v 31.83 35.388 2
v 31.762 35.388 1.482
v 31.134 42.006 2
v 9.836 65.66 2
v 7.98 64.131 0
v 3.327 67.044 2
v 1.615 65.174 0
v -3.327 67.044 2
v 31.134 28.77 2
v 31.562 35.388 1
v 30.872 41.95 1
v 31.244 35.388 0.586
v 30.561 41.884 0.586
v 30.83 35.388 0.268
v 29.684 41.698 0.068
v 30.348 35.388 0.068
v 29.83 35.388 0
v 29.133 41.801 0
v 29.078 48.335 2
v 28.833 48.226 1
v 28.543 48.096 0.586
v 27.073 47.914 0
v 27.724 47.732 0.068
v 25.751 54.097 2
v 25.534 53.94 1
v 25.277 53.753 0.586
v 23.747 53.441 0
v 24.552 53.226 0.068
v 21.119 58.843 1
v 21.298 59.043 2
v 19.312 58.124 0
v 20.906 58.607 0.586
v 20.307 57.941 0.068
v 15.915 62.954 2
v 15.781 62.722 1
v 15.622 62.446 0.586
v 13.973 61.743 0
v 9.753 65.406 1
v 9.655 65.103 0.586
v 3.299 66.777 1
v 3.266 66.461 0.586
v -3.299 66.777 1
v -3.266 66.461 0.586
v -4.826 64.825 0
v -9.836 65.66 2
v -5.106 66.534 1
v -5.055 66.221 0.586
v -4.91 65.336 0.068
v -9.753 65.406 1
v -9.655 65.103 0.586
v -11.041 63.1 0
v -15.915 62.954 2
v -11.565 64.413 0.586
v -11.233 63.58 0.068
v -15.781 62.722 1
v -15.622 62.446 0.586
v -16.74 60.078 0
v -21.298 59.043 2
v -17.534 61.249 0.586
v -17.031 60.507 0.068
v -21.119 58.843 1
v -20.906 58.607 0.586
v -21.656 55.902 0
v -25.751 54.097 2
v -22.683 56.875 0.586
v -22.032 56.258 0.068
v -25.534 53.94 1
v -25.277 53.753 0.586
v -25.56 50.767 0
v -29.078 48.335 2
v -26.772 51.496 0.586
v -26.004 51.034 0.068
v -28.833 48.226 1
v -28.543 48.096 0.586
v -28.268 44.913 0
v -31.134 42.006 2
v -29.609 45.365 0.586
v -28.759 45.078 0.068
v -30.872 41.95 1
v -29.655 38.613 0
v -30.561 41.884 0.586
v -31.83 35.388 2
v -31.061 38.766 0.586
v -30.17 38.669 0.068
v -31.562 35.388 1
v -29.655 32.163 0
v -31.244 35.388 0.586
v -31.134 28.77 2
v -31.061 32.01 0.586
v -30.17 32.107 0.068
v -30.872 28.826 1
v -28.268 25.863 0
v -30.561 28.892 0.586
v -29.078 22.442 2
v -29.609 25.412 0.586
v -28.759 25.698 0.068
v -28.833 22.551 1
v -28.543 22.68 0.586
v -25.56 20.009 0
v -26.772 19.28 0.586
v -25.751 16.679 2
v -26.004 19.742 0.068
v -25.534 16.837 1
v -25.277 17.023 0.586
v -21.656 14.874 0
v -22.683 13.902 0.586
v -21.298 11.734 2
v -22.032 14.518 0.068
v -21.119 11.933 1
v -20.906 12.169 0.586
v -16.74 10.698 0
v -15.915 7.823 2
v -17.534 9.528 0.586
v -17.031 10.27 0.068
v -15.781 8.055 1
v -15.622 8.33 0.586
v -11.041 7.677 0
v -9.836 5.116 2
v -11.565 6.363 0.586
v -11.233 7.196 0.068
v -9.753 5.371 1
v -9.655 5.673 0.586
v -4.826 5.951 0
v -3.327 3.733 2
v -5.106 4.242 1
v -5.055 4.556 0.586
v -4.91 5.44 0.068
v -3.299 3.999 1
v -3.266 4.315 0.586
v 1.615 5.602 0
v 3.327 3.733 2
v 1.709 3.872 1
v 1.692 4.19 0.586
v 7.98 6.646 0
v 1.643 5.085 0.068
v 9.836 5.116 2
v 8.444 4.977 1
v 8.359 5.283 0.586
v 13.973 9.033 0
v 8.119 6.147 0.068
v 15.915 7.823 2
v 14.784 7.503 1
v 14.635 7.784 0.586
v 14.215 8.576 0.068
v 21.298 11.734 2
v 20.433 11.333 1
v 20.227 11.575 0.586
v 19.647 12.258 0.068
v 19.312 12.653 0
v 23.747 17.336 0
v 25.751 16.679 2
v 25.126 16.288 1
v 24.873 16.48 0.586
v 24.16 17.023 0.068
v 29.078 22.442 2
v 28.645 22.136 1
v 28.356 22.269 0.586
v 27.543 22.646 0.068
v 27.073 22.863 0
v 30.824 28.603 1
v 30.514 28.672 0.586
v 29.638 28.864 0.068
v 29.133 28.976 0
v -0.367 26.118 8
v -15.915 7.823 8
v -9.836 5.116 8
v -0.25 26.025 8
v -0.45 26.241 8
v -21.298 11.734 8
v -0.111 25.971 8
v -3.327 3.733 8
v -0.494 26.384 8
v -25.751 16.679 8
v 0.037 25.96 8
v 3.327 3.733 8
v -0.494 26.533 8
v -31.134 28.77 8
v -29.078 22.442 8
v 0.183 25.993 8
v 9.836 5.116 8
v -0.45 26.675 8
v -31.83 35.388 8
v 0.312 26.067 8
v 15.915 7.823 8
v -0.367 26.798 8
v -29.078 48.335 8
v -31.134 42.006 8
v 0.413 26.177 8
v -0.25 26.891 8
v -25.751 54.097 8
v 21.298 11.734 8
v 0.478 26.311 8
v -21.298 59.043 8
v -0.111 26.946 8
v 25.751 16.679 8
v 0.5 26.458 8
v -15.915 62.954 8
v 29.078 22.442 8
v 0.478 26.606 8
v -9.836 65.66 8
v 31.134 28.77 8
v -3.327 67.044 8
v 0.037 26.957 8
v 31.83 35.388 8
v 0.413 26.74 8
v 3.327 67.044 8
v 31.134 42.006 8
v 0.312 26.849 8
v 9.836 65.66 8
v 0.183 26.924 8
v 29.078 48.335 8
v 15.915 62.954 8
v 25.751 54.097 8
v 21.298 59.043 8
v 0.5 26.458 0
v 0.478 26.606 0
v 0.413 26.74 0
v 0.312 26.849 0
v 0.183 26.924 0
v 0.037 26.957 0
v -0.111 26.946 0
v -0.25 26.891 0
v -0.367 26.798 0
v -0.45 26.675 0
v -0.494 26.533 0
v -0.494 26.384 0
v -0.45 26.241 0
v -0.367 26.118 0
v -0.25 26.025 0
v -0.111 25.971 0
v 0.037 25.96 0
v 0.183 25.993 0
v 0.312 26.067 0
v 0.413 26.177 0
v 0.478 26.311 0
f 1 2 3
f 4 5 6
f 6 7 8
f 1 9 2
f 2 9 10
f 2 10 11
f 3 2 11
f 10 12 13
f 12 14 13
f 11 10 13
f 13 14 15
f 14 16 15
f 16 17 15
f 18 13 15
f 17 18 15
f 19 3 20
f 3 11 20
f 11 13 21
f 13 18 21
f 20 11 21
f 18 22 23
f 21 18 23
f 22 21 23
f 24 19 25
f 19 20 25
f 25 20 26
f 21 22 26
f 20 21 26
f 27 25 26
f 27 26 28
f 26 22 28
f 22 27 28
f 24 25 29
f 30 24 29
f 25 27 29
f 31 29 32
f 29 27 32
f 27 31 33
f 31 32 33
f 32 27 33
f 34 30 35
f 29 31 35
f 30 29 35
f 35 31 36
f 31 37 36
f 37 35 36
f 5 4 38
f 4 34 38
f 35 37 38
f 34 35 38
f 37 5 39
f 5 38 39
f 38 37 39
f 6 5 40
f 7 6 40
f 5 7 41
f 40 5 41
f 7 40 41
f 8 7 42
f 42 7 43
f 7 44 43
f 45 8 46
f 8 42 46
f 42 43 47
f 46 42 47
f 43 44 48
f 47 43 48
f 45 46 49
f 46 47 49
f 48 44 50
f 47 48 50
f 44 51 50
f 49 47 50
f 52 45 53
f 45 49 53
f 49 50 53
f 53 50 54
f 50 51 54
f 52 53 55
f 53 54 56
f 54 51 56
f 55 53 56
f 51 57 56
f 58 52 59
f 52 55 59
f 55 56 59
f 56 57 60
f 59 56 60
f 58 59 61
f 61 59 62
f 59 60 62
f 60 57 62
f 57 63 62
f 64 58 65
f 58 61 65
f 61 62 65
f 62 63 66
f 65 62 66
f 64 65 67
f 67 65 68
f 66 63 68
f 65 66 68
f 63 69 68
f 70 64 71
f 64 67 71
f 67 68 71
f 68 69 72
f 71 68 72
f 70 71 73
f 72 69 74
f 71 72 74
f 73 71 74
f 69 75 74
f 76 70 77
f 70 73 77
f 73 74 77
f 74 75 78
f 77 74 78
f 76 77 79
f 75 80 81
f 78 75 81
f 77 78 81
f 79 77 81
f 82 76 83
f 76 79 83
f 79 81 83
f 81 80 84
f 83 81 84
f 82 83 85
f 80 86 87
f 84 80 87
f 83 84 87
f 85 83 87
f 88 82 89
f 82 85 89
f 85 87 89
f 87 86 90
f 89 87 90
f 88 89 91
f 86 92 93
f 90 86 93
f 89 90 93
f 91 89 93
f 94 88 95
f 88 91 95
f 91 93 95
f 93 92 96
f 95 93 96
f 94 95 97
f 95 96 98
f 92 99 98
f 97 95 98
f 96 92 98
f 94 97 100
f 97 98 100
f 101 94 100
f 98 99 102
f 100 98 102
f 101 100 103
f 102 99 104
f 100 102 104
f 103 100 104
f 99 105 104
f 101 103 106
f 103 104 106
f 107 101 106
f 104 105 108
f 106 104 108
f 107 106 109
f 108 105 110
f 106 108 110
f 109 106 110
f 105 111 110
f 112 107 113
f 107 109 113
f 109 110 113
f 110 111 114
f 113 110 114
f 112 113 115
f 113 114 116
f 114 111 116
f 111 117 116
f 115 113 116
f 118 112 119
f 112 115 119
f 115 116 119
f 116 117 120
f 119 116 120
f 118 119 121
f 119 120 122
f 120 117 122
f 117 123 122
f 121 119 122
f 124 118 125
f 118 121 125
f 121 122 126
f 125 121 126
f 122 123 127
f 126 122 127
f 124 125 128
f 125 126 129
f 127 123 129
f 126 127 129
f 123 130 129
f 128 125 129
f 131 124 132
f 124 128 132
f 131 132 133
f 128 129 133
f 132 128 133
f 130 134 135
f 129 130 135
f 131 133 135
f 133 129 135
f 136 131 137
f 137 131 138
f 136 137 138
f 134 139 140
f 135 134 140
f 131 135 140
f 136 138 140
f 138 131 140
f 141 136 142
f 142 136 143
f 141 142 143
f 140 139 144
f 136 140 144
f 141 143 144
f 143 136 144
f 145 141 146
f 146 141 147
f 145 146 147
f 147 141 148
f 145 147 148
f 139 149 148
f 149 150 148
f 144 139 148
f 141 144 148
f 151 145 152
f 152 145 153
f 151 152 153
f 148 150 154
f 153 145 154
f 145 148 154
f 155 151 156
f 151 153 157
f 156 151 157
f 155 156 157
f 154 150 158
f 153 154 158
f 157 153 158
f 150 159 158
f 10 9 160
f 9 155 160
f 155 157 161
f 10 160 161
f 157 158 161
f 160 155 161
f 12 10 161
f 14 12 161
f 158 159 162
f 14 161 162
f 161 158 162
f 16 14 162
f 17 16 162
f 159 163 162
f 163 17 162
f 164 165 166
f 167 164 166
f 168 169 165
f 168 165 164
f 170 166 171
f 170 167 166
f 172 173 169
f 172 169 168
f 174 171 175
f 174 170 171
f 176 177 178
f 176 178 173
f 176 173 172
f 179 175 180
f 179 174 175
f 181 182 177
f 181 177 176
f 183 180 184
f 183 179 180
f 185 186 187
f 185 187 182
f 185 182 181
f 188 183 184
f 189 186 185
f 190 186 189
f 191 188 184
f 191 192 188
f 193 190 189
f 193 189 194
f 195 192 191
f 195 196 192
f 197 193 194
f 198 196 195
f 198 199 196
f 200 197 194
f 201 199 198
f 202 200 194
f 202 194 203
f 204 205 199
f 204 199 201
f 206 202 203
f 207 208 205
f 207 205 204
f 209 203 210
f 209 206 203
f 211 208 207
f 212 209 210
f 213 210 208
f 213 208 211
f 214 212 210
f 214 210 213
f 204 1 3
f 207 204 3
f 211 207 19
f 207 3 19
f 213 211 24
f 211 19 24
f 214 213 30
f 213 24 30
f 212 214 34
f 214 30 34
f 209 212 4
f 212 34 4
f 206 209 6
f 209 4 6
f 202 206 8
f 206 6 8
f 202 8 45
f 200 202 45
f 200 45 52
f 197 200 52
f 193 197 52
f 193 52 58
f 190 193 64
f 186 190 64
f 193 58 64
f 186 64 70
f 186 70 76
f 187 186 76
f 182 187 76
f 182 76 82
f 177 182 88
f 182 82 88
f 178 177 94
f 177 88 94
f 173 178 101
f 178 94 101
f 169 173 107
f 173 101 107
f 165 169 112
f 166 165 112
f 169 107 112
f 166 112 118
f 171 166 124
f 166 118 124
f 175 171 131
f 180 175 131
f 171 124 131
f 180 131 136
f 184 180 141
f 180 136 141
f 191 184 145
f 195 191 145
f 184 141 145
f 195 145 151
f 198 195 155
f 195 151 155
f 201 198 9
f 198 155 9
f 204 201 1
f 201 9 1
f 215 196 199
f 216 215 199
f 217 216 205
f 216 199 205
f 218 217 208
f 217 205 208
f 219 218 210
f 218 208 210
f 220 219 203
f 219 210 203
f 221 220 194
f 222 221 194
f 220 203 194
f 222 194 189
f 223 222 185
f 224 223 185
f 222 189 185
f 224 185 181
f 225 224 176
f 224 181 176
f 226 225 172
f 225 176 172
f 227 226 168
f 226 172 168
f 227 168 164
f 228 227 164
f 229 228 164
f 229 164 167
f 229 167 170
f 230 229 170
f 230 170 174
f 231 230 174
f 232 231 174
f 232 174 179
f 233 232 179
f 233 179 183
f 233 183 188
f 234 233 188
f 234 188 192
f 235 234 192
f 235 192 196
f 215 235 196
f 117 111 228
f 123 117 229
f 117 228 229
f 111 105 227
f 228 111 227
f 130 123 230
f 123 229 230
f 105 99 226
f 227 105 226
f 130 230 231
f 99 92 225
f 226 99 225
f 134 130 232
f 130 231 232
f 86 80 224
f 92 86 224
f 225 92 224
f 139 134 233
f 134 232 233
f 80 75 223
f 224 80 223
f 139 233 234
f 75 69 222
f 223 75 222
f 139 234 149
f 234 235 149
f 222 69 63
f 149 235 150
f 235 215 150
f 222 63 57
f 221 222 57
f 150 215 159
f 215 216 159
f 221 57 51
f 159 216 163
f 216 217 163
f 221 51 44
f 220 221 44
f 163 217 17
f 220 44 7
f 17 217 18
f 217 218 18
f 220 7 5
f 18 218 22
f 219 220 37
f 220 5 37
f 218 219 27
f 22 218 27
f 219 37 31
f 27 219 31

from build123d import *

# Parameters (mm, degrees)
SKETCH2_R           = 31.83
BOSS_EXTRUDE1_DEPTH = 8
FILLET1_R           = 2
SKETCH3_R           = 0.5
CUT_EXTRUDE1_DEPTH  = 9


with BuildPart() as part:
    # Sketch2 → Boss-Extrude1 (new body)
    with BuildSketch(Plane.XY):
        with Locations((0, 35.388213047)):
            Circle(SKETCH2_R)
    extrude(amount=BOSS_EXTRUDE1_DEPTH)

    # Fillet1
    fillet1_edges = [part.edges().sort_by_distance(p)[0] for p in [
        (-31.83, 35.388213047, 0),
    ]]
    fillet(fillet1_edges, radius=FILLET1_R)

    # Sketch3 → Cut-Extrude1 (cut, through all)
    with BuildSketch(Plane.XY.offset(8)):
        with Locations((0, 26.458213047)):
            Circle(SKETCH3_R)
    extrude(amount=-CUT_EXTRUDE1_DEPTH, mode=Mode.SUBTRACT)


solid = part.part
